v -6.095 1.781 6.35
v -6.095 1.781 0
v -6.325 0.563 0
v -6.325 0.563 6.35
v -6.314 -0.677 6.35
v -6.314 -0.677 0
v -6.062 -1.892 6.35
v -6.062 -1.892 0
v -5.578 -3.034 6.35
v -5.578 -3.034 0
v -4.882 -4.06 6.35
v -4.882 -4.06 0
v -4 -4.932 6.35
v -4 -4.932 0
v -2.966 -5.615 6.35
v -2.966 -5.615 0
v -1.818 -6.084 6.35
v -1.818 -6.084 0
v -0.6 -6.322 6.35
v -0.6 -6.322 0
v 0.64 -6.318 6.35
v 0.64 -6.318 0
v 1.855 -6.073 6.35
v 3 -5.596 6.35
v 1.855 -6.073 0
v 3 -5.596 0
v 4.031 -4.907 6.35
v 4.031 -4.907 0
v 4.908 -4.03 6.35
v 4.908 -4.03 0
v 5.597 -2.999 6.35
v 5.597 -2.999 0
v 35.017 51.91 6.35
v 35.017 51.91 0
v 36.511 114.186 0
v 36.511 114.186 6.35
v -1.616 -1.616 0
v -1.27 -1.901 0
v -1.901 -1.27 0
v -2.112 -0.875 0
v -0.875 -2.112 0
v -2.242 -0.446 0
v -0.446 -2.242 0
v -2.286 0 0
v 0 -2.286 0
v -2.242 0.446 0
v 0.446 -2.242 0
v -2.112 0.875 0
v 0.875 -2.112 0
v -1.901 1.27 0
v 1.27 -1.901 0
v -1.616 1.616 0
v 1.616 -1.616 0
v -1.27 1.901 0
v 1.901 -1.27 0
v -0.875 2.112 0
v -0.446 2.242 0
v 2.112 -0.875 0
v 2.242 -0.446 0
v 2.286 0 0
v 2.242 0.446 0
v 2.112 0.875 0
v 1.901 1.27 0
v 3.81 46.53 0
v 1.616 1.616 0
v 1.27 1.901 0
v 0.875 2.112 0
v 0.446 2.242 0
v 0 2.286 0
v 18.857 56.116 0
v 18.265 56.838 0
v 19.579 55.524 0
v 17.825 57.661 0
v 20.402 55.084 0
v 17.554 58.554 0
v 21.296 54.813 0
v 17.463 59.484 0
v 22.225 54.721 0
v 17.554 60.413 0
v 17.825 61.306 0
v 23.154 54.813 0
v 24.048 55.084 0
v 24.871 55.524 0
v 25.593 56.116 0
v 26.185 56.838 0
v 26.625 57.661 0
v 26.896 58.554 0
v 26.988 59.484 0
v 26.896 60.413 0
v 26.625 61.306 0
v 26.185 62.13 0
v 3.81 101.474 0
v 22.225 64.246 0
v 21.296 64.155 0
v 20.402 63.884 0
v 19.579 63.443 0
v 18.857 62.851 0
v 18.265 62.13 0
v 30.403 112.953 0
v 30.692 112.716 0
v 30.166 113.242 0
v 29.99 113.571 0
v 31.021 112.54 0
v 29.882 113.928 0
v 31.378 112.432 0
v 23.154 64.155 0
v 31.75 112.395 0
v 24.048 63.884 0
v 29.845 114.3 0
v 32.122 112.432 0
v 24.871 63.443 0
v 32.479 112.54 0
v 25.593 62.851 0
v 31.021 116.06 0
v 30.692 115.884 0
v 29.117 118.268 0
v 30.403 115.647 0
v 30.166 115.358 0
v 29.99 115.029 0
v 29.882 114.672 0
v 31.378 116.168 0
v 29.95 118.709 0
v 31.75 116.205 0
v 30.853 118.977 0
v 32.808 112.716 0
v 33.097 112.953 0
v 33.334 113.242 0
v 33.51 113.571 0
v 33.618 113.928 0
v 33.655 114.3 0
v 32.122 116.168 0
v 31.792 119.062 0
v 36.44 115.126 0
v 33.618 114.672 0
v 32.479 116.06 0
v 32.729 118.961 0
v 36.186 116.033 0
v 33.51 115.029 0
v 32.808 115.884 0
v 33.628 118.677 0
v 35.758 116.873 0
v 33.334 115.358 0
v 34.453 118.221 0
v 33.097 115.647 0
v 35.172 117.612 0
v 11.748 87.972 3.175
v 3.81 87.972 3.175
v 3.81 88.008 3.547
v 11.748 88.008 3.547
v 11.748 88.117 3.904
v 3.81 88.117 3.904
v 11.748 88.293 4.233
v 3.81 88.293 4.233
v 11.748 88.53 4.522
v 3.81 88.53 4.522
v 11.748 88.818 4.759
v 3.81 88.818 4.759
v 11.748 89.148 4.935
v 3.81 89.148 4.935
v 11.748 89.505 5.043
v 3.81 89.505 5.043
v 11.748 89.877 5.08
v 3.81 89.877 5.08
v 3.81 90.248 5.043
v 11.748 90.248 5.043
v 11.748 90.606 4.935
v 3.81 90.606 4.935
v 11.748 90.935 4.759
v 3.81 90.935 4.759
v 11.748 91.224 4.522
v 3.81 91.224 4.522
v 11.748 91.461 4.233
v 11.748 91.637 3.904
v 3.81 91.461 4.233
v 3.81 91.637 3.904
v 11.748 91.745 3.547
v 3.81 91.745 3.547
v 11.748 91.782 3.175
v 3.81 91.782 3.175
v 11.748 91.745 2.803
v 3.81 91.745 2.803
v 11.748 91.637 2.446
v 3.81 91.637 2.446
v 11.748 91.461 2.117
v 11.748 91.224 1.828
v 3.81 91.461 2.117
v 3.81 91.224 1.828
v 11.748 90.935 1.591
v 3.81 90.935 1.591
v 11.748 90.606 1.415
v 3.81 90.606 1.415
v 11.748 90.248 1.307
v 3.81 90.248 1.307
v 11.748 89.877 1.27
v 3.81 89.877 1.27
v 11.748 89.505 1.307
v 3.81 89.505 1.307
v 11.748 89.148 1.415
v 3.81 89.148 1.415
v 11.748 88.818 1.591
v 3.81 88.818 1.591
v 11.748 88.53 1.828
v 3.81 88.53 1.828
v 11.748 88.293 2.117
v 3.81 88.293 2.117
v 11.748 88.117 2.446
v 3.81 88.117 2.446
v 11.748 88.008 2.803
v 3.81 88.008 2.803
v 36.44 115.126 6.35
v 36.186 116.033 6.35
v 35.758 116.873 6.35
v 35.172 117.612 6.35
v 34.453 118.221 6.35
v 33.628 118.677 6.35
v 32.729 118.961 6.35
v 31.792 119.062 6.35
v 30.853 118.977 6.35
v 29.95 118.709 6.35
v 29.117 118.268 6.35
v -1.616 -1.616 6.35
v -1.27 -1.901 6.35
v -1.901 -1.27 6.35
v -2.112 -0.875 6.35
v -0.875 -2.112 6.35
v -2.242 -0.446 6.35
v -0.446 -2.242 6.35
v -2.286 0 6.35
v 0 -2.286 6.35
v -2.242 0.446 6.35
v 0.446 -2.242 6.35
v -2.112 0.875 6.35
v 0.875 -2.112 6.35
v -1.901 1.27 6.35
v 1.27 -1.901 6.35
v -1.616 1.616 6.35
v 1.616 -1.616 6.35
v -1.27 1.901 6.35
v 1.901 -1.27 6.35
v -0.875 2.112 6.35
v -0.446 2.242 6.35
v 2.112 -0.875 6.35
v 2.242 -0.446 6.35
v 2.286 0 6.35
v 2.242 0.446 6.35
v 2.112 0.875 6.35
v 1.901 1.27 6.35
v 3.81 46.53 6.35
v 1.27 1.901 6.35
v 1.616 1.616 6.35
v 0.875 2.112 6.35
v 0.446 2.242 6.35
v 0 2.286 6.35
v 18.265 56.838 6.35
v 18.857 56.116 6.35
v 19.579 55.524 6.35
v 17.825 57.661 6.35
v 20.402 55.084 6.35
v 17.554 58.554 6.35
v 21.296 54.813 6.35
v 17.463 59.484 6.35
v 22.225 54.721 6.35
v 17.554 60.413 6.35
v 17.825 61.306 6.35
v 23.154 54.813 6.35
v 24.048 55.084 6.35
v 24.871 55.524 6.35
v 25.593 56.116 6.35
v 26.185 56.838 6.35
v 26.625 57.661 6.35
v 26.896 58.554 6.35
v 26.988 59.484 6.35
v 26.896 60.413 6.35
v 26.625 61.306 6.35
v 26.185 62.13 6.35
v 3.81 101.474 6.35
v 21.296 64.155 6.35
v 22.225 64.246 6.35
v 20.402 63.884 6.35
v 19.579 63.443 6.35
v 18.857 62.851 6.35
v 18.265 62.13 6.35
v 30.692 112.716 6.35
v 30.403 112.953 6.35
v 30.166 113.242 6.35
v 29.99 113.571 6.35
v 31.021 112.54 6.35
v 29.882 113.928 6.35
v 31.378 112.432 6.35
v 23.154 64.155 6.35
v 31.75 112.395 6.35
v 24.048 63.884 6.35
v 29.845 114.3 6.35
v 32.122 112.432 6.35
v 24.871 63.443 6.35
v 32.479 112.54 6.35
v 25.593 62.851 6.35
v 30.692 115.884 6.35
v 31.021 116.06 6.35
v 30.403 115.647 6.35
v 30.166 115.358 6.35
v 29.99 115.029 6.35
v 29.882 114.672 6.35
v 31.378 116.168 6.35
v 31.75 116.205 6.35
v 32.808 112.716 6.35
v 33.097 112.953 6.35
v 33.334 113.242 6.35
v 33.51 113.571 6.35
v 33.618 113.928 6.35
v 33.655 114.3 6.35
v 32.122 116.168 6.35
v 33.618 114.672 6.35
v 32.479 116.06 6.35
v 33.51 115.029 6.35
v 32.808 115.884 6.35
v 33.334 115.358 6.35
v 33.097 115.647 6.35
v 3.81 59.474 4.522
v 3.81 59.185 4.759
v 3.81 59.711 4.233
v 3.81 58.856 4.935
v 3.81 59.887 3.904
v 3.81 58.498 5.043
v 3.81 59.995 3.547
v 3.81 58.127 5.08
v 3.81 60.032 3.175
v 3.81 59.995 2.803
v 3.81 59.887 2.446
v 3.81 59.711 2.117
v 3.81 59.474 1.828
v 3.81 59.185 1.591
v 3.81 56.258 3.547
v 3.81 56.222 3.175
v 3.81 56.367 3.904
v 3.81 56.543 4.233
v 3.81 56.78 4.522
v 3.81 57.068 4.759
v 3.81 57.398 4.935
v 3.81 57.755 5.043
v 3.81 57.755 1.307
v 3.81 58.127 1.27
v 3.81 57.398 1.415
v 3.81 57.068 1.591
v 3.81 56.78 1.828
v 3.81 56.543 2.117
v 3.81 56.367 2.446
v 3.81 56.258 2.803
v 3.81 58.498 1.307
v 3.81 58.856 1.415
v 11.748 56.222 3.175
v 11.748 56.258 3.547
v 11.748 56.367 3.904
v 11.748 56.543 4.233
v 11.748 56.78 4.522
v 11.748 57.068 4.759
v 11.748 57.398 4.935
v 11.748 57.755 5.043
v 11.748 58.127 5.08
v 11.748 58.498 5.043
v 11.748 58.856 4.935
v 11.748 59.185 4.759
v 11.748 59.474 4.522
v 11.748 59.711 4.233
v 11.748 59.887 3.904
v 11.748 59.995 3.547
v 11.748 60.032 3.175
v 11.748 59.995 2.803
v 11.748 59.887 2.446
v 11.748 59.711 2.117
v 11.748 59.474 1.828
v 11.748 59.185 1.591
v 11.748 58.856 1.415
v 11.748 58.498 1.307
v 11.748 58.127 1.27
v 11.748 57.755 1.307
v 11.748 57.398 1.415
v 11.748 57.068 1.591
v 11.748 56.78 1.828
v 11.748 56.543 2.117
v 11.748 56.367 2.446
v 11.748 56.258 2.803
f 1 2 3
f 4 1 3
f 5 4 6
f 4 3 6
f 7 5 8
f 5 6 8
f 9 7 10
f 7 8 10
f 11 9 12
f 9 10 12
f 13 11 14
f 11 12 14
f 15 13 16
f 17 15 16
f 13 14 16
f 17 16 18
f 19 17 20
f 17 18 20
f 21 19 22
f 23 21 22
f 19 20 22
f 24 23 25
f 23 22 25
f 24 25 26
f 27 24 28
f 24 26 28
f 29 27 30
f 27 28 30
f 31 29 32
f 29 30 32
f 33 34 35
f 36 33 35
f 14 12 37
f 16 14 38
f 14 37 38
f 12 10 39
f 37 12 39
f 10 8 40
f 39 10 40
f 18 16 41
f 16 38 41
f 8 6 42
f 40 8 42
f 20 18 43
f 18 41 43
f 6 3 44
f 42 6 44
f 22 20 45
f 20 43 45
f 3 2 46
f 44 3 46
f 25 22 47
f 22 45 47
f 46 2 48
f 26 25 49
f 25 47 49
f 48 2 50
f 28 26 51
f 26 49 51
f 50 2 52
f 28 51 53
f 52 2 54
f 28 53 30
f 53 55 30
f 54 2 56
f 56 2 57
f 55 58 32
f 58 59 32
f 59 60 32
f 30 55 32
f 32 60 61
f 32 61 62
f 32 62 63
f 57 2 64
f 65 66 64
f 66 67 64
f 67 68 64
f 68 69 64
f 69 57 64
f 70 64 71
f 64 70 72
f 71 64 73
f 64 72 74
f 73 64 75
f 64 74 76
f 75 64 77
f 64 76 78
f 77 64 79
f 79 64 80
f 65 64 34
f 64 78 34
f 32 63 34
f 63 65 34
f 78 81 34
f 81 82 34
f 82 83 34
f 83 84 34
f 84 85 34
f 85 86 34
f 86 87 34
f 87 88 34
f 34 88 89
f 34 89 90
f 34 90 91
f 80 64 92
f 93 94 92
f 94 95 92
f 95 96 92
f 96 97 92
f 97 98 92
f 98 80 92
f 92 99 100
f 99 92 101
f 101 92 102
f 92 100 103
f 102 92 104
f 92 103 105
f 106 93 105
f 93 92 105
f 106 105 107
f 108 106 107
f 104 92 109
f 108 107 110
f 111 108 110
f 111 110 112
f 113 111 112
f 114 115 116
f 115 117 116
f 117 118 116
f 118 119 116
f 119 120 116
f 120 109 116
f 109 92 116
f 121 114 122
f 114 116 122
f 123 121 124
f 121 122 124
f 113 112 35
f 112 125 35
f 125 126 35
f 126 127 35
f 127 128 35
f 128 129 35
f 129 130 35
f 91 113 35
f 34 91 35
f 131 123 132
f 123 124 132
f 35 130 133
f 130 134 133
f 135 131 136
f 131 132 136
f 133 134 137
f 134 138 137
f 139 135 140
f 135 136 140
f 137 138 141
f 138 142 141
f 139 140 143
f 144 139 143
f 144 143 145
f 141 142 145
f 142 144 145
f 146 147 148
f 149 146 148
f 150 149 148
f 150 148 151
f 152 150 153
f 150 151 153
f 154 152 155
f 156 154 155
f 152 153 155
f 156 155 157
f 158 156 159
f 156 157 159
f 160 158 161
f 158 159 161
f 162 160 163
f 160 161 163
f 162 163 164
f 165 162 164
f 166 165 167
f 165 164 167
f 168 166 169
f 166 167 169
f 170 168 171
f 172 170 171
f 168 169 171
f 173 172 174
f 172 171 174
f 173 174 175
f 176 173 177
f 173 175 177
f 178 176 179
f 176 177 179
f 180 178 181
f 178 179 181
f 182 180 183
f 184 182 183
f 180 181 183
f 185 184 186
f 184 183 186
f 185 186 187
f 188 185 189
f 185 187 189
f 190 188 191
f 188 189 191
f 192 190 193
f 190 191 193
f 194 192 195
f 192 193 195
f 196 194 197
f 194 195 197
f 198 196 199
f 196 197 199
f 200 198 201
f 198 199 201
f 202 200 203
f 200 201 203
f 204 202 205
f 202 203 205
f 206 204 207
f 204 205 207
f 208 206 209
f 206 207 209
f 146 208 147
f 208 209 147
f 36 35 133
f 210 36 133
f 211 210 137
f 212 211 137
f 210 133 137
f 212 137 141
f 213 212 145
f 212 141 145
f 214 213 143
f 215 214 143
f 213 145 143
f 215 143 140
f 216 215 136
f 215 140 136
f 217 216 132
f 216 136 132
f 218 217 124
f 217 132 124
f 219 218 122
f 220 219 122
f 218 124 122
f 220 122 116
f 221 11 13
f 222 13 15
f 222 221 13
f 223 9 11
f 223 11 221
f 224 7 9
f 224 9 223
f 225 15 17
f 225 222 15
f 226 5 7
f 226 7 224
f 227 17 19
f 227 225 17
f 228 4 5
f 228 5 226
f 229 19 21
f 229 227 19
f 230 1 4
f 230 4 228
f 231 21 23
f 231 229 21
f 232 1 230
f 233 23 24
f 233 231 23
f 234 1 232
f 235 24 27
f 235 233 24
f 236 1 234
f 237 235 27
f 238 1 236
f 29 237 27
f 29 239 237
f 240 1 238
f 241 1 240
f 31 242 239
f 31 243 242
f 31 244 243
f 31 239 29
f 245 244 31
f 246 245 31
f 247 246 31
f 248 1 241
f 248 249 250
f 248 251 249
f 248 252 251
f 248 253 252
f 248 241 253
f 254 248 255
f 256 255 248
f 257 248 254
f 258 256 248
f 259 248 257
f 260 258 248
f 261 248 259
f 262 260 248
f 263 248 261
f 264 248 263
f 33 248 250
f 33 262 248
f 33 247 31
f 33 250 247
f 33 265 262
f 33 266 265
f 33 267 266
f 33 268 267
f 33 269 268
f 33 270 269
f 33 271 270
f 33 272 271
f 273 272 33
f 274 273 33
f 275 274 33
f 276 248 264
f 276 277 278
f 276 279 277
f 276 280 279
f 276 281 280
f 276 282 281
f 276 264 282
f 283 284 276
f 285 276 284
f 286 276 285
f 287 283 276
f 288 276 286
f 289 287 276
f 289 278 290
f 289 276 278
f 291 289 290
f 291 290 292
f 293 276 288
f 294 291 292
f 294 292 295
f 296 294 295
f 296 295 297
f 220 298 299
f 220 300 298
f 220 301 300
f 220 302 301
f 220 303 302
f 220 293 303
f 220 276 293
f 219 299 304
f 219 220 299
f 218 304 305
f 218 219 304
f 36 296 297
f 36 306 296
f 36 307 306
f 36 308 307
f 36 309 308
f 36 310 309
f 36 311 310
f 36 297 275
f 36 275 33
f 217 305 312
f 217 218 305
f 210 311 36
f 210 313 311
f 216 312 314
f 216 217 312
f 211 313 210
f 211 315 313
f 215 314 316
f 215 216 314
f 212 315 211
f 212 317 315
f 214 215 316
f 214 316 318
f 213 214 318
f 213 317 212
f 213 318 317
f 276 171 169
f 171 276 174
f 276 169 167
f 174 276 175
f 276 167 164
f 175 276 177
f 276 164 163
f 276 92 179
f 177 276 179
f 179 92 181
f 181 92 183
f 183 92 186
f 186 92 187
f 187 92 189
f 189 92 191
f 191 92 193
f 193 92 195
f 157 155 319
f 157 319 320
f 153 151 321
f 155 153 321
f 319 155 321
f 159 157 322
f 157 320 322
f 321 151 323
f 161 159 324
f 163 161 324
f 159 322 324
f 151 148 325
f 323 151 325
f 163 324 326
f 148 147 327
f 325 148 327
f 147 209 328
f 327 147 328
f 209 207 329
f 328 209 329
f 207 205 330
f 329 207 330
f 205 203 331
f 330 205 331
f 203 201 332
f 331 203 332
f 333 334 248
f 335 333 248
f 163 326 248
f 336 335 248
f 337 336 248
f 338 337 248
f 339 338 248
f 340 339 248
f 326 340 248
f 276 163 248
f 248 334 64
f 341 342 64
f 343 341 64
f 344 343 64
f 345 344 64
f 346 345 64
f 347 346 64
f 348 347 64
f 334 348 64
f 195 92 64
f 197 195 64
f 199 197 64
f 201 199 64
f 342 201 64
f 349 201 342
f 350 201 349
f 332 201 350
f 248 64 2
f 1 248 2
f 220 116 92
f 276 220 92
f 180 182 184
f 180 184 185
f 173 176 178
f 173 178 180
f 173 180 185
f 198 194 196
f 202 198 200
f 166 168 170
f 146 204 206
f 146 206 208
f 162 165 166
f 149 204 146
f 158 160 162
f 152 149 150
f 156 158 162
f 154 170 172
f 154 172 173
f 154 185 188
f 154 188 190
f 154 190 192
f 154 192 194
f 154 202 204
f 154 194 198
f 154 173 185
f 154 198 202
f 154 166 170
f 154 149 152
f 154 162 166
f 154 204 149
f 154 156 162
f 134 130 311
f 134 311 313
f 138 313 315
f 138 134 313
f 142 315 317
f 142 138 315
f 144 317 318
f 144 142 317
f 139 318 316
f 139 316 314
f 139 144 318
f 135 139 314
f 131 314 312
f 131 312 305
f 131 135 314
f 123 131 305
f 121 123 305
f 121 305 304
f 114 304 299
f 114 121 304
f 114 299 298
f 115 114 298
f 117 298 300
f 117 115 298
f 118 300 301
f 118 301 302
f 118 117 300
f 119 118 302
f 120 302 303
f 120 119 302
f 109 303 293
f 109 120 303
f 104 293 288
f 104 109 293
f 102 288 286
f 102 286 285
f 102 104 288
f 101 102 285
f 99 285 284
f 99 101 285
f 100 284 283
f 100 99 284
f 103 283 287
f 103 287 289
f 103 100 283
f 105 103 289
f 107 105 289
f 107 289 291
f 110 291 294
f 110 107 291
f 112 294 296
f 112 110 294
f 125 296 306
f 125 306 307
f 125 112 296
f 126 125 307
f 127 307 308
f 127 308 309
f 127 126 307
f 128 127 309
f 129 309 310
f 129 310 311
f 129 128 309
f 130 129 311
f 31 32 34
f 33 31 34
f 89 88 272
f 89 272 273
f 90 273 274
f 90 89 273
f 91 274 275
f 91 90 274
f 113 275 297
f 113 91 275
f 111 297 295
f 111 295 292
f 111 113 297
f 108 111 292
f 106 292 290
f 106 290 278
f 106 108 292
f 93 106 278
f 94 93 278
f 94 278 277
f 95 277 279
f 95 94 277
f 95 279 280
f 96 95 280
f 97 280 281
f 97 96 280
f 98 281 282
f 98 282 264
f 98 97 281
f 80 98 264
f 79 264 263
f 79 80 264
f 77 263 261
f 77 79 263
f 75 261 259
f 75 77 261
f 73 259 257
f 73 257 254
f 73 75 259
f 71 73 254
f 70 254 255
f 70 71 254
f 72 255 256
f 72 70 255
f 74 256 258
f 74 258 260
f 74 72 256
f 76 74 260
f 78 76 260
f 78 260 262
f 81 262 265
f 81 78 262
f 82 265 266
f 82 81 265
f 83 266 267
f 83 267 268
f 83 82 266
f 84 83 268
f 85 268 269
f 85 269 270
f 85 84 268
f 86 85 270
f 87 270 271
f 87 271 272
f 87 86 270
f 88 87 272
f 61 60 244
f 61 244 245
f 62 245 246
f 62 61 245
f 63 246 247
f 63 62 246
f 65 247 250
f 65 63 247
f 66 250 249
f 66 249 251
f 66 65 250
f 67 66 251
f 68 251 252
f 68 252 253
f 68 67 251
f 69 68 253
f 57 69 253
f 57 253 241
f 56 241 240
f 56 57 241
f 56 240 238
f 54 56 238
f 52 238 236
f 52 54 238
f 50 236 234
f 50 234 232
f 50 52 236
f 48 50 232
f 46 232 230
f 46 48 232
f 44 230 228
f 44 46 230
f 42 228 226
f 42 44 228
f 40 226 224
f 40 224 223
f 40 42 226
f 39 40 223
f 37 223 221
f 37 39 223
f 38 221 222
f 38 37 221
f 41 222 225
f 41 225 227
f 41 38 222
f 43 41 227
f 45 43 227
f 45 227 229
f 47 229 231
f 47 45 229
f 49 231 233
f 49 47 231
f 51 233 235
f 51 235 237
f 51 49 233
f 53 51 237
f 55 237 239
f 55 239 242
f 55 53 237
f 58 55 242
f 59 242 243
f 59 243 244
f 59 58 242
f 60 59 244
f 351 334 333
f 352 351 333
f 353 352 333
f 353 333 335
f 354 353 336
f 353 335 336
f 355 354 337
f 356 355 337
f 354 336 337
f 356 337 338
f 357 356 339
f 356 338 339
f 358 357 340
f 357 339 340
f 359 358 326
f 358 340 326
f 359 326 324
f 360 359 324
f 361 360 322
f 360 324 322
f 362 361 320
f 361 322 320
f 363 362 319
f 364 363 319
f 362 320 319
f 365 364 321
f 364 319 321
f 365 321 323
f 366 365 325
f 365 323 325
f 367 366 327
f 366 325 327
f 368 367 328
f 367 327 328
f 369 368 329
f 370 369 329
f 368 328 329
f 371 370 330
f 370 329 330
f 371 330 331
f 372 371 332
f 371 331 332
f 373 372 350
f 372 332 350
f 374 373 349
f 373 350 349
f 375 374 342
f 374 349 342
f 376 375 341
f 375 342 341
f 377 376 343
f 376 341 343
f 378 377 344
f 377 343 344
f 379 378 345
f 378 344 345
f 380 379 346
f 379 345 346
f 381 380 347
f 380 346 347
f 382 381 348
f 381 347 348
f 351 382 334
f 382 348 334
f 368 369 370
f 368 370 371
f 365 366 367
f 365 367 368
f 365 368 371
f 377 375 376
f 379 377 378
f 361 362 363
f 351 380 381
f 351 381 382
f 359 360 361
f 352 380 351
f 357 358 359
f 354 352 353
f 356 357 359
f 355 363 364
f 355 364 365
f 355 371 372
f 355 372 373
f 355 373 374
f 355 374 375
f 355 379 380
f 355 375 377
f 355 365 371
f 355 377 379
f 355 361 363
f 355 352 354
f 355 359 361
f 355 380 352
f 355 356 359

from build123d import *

# Parameters (mm, degrees)
SKETCH1_R           = 2.286
SKETCH1_R_2         = 1.905
SKETCH1_R_3         = 4.7625
BOSS_EXTRUDE1_DEPTH = 6.35
SKETCH2_R           = 1.905
CUT_EXTRUDE1_DEPTH  = 7.9375


with BuildPart() as part:
    # Sketch1 → Boss-Extrude1 (new body)
    with BuildSketch(Plane.XY):
        with BuildLine():
            Line((35.017380191, 51.909842308), (36.511130592, 114.185799576))
            ThreePointArc((36.511130592, 114.185799576), (34.05178904, 118.469313309), (29.116569093, 118.26817942))
            Line((29.116569093, 118.26817942), (3.81, 101.473802417))
            Line((3.81, 101.473802417), (3.81, 46.529605935))
            Line((3.81, 46.529605935), (-6.095047303, 1.78126314))
            ThreePointArc((-6.095047303, 1.78126314), (-2.403049878, -5.877742023), (5.597196577, -2.998981573))
            Line((5.597196577, -2.998981573), (35.017380191, 51.909842308))
        make_face()
        Circle(SKETCH1_R, mode=Mode.SUBTRACT)
        with Locations((31.75, 114.3)):
            Circle(SKETCH1_R_2, mode=Mode.SUBTRACT)
        with Locations((22.225, 59.483605935)):
            Circle(SKETCH1_R_3, mode=Mode.SUBTRACT)
    extrude(amount=BOSS_EXTRUDE1_DEPTH)

    # Sketch2 → Cut-Extrude1 (cut)
    with BuildSketch(Plane.ZY.offset(-3.81)):
        with Locations(Location((3.175, 89.876704176, 0), (0, 0, 270))):
            Circle(SKETCH2_R)
        with Locations(Location((3.175, 58.126704176, 0), (0, 0, 270))):
            Circle(SKETCH2_R)
    extrude(amount=-CUT_EXTRUDE1_DEPTH, mode=Mode.SUBTRACT)


solid = part.part
